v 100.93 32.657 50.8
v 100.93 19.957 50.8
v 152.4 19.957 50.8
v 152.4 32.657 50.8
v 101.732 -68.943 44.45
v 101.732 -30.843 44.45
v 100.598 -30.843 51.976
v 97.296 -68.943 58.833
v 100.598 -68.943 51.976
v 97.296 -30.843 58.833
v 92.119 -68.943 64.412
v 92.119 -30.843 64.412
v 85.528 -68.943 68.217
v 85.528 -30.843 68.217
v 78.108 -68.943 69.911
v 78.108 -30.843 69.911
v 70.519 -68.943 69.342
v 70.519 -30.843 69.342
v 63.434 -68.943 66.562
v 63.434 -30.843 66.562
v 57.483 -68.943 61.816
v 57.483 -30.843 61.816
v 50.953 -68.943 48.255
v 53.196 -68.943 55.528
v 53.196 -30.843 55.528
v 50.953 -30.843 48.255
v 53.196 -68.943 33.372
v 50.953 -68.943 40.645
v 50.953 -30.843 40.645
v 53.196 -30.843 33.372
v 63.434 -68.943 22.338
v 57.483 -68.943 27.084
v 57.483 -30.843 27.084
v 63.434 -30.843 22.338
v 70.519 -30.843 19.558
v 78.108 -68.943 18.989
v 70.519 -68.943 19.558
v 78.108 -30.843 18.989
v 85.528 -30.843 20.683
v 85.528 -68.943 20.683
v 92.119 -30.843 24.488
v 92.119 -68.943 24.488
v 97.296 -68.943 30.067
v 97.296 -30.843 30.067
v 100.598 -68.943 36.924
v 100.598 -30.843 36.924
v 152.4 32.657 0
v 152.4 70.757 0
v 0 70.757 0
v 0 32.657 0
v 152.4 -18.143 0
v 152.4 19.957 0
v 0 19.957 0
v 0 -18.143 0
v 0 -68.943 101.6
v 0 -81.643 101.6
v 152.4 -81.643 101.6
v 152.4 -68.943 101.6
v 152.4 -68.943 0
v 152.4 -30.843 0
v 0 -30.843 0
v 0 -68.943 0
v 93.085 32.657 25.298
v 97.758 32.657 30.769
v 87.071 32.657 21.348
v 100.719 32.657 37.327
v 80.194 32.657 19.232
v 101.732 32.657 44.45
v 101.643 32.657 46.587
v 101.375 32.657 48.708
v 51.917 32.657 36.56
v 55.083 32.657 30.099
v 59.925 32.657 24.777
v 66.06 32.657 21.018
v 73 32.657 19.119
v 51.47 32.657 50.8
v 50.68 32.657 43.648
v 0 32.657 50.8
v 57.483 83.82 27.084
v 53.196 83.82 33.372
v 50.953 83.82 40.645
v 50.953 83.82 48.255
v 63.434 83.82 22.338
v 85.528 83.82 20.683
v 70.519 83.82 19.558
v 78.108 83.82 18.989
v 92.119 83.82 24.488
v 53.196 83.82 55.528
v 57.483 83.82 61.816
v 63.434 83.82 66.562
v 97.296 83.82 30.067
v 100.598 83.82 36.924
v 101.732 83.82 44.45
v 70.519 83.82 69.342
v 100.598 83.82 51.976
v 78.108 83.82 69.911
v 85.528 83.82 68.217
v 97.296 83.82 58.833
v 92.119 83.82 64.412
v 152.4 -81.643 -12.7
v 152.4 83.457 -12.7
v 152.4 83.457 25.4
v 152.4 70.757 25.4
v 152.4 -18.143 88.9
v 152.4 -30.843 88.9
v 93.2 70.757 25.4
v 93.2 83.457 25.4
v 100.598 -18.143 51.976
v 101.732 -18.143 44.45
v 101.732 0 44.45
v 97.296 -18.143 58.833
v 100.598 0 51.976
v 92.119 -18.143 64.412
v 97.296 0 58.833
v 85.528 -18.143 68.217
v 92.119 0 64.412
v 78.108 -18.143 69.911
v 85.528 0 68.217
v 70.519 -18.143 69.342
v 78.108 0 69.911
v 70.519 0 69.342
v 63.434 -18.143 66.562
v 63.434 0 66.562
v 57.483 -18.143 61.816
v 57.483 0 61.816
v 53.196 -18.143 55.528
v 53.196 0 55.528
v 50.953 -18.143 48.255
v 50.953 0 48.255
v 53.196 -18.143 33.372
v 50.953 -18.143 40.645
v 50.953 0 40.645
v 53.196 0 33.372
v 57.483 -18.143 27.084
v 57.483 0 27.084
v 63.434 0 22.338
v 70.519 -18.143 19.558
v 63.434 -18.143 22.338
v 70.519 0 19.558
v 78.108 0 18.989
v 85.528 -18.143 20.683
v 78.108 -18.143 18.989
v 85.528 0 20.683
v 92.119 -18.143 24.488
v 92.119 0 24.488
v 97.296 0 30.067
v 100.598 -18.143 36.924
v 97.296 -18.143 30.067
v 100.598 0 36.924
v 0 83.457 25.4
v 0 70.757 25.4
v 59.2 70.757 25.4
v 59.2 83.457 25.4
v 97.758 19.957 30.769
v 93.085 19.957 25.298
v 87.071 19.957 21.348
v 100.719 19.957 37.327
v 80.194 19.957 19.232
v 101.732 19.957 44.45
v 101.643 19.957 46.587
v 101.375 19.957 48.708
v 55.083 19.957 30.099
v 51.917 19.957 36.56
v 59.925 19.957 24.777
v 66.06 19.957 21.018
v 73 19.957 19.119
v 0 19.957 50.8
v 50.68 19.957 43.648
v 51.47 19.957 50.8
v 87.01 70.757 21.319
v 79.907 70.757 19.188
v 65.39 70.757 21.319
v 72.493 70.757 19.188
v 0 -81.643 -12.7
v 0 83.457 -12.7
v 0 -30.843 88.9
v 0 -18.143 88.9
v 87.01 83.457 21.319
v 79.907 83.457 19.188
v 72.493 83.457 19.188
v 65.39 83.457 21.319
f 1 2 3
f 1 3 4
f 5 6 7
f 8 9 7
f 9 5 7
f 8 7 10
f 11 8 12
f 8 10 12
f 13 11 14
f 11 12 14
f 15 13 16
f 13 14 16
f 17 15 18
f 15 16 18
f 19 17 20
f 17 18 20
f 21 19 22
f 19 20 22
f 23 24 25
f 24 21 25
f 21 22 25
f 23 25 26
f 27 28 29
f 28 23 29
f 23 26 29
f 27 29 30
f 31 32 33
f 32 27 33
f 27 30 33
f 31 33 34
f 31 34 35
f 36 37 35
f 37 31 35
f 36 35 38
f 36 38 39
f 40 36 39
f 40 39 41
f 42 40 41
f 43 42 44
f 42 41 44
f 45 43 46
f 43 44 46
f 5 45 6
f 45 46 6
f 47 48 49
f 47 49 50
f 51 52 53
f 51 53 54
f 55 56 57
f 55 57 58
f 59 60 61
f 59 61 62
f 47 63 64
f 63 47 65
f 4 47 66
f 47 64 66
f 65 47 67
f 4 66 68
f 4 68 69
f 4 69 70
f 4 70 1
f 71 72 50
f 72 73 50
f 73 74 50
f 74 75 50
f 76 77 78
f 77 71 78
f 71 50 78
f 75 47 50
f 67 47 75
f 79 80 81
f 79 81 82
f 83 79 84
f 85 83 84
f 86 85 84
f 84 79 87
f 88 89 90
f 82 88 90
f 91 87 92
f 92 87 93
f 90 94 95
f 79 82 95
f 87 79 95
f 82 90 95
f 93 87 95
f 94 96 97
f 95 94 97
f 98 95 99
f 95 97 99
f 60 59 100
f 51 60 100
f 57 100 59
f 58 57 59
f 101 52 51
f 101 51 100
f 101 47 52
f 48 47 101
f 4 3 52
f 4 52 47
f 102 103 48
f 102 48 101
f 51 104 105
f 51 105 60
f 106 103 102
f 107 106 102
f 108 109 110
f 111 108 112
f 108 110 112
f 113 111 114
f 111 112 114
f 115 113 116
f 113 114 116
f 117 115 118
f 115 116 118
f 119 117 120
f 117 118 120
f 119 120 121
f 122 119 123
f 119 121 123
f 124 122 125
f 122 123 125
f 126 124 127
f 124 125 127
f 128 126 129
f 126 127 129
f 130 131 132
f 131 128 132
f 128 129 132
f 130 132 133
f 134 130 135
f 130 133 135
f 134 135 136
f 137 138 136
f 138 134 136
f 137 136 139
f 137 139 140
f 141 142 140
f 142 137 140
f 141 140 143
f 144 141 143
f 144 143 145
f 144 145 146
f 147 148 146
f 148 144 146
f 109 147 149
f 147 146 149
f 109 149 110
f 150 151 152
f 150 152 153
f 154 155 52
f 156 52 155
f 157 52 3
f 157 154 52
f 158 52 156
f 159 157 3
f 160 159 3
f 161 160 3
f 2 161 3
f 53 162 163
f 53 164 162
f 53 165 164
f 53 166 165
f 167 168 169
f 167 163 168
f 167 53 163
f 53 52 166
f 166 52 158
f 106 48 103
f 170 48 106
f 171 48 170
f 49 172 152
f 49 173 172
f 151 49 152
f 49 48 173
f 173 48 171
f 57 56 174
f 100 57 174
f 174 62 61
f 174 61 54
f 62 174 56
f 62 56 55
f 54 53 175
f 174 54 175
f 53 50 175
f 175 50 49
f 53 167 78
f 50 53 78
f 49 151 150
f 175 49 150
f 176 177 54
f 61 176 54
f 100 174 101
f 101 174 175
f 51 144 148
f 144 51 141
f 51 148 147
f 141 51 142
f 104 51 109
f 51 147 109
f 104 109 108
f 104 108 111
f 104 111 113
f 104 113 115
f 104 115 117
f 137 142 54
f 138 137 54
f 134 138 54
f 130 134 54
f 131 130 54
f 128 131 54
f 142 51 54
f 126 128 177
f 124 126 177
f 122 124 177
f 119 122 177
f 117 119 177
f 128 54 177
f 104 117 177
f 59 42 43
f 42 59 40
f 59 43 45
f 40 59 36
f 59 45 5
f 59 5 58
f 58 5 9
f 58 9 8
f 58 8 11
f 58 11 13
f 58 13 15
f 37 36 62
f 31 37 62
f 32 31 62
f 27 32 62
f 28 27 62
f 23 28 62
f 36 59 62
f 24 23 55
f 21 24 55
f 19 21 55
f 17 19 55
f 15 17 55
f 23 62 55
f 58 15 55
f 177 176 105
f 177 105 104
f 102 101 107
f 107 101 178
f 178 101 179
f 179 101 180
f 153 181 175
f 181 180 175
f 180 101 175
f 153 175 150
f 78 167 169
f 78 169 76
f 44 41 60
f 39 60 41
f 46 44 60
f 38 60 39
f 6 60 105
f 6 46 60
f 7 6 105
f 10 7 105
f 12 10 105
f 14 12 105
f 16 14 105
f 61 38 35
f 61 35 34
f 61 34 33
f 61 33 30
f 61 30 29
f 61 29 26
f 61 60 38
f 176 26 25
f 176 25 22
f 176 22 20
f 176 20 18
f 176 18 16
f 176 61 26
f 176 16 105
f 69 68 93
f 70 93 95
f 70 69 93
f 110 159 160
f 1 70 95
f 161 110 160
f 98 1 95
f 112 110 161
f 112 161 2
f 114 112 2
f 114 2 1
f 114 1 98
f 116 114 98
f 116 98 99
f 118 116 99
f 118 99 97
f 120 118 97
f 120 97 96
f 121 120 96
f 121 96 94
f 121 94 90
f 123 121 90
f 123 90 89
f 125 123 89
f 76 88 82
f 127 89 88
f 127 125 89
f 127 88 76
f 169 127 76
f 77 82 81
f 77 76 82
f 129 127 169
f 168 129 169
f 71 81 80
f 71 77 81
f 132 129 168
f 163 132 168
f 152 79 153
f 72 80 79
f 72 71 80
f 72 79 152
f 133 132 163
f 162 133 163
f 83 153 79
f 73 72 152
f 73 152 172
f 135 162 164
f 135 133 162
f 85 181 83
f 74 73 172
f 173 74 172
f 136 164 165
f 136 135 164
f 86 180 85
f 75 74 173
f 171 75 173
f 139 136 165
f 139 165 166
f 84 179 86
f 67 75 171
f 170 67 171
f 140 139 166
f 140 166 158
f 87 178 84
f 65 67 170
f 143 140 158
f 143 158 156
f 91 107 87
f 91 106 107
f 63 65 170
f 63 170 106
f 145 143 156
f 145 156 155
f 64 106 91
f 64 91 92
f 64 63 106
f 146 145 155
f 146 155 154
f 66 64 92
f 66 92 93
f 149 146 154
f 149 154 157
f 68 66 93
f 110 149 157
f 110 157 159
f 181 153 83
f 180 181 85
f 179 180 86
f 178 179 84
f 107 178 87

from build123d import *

# Parameters (mm, degrees)
F0_W          = 12.7
F0_H          = 25.4
F0_H_2        = 50.8
F0_H_3        = 88.9
F0_H_4        = 101.6
F1_DEPTH      = 152.4
F2_R          = 25.532371
F3_DEPTH      = 81.28
F3_DEPTH_BACK = 83.82


with BuildPart() as f1:
    # F0 (on Right) → F1 (new body)
    with BuildSketch(Plane.YZ):
        Polygon((-68.94286, 0), (-81.64286, 0), (-81.64286, -12.7), (83.45714, -12.7), (83.45714, 0), (70.75714, 0), (32.65714, 0), (19.95714, 0), (-18.14286, 0), (-30.84286, 0), align=None)
        with Locations((77.10714, 12.7)):
            Rectangle(F0_W, F0_H)
        with Locations((26.30714, 25.4)):
            Rectangle(F0_W, F0_H_2)
        with Locations((-24.49286, 44.45)):
            Rectangle(F0_W, F0_H_3)
        with Locations((-75.29286, 50.8)):
            Rectangle(F0_W, F0_H_4)
    extrude(amount=F1_DEPTH)

    # F2 (on Front) → F3 (join, two sides)
    with BuildSketch(Plane.XZ) as f3_sk:
        with Locations((76.2, 44.45)):
            Circle(F2_R)
    extrude(amount=F3_DEPTH)
    extrude(f3_sk.sketch, amount=-F3_DEPTH_BACK)


solid = f1.part
